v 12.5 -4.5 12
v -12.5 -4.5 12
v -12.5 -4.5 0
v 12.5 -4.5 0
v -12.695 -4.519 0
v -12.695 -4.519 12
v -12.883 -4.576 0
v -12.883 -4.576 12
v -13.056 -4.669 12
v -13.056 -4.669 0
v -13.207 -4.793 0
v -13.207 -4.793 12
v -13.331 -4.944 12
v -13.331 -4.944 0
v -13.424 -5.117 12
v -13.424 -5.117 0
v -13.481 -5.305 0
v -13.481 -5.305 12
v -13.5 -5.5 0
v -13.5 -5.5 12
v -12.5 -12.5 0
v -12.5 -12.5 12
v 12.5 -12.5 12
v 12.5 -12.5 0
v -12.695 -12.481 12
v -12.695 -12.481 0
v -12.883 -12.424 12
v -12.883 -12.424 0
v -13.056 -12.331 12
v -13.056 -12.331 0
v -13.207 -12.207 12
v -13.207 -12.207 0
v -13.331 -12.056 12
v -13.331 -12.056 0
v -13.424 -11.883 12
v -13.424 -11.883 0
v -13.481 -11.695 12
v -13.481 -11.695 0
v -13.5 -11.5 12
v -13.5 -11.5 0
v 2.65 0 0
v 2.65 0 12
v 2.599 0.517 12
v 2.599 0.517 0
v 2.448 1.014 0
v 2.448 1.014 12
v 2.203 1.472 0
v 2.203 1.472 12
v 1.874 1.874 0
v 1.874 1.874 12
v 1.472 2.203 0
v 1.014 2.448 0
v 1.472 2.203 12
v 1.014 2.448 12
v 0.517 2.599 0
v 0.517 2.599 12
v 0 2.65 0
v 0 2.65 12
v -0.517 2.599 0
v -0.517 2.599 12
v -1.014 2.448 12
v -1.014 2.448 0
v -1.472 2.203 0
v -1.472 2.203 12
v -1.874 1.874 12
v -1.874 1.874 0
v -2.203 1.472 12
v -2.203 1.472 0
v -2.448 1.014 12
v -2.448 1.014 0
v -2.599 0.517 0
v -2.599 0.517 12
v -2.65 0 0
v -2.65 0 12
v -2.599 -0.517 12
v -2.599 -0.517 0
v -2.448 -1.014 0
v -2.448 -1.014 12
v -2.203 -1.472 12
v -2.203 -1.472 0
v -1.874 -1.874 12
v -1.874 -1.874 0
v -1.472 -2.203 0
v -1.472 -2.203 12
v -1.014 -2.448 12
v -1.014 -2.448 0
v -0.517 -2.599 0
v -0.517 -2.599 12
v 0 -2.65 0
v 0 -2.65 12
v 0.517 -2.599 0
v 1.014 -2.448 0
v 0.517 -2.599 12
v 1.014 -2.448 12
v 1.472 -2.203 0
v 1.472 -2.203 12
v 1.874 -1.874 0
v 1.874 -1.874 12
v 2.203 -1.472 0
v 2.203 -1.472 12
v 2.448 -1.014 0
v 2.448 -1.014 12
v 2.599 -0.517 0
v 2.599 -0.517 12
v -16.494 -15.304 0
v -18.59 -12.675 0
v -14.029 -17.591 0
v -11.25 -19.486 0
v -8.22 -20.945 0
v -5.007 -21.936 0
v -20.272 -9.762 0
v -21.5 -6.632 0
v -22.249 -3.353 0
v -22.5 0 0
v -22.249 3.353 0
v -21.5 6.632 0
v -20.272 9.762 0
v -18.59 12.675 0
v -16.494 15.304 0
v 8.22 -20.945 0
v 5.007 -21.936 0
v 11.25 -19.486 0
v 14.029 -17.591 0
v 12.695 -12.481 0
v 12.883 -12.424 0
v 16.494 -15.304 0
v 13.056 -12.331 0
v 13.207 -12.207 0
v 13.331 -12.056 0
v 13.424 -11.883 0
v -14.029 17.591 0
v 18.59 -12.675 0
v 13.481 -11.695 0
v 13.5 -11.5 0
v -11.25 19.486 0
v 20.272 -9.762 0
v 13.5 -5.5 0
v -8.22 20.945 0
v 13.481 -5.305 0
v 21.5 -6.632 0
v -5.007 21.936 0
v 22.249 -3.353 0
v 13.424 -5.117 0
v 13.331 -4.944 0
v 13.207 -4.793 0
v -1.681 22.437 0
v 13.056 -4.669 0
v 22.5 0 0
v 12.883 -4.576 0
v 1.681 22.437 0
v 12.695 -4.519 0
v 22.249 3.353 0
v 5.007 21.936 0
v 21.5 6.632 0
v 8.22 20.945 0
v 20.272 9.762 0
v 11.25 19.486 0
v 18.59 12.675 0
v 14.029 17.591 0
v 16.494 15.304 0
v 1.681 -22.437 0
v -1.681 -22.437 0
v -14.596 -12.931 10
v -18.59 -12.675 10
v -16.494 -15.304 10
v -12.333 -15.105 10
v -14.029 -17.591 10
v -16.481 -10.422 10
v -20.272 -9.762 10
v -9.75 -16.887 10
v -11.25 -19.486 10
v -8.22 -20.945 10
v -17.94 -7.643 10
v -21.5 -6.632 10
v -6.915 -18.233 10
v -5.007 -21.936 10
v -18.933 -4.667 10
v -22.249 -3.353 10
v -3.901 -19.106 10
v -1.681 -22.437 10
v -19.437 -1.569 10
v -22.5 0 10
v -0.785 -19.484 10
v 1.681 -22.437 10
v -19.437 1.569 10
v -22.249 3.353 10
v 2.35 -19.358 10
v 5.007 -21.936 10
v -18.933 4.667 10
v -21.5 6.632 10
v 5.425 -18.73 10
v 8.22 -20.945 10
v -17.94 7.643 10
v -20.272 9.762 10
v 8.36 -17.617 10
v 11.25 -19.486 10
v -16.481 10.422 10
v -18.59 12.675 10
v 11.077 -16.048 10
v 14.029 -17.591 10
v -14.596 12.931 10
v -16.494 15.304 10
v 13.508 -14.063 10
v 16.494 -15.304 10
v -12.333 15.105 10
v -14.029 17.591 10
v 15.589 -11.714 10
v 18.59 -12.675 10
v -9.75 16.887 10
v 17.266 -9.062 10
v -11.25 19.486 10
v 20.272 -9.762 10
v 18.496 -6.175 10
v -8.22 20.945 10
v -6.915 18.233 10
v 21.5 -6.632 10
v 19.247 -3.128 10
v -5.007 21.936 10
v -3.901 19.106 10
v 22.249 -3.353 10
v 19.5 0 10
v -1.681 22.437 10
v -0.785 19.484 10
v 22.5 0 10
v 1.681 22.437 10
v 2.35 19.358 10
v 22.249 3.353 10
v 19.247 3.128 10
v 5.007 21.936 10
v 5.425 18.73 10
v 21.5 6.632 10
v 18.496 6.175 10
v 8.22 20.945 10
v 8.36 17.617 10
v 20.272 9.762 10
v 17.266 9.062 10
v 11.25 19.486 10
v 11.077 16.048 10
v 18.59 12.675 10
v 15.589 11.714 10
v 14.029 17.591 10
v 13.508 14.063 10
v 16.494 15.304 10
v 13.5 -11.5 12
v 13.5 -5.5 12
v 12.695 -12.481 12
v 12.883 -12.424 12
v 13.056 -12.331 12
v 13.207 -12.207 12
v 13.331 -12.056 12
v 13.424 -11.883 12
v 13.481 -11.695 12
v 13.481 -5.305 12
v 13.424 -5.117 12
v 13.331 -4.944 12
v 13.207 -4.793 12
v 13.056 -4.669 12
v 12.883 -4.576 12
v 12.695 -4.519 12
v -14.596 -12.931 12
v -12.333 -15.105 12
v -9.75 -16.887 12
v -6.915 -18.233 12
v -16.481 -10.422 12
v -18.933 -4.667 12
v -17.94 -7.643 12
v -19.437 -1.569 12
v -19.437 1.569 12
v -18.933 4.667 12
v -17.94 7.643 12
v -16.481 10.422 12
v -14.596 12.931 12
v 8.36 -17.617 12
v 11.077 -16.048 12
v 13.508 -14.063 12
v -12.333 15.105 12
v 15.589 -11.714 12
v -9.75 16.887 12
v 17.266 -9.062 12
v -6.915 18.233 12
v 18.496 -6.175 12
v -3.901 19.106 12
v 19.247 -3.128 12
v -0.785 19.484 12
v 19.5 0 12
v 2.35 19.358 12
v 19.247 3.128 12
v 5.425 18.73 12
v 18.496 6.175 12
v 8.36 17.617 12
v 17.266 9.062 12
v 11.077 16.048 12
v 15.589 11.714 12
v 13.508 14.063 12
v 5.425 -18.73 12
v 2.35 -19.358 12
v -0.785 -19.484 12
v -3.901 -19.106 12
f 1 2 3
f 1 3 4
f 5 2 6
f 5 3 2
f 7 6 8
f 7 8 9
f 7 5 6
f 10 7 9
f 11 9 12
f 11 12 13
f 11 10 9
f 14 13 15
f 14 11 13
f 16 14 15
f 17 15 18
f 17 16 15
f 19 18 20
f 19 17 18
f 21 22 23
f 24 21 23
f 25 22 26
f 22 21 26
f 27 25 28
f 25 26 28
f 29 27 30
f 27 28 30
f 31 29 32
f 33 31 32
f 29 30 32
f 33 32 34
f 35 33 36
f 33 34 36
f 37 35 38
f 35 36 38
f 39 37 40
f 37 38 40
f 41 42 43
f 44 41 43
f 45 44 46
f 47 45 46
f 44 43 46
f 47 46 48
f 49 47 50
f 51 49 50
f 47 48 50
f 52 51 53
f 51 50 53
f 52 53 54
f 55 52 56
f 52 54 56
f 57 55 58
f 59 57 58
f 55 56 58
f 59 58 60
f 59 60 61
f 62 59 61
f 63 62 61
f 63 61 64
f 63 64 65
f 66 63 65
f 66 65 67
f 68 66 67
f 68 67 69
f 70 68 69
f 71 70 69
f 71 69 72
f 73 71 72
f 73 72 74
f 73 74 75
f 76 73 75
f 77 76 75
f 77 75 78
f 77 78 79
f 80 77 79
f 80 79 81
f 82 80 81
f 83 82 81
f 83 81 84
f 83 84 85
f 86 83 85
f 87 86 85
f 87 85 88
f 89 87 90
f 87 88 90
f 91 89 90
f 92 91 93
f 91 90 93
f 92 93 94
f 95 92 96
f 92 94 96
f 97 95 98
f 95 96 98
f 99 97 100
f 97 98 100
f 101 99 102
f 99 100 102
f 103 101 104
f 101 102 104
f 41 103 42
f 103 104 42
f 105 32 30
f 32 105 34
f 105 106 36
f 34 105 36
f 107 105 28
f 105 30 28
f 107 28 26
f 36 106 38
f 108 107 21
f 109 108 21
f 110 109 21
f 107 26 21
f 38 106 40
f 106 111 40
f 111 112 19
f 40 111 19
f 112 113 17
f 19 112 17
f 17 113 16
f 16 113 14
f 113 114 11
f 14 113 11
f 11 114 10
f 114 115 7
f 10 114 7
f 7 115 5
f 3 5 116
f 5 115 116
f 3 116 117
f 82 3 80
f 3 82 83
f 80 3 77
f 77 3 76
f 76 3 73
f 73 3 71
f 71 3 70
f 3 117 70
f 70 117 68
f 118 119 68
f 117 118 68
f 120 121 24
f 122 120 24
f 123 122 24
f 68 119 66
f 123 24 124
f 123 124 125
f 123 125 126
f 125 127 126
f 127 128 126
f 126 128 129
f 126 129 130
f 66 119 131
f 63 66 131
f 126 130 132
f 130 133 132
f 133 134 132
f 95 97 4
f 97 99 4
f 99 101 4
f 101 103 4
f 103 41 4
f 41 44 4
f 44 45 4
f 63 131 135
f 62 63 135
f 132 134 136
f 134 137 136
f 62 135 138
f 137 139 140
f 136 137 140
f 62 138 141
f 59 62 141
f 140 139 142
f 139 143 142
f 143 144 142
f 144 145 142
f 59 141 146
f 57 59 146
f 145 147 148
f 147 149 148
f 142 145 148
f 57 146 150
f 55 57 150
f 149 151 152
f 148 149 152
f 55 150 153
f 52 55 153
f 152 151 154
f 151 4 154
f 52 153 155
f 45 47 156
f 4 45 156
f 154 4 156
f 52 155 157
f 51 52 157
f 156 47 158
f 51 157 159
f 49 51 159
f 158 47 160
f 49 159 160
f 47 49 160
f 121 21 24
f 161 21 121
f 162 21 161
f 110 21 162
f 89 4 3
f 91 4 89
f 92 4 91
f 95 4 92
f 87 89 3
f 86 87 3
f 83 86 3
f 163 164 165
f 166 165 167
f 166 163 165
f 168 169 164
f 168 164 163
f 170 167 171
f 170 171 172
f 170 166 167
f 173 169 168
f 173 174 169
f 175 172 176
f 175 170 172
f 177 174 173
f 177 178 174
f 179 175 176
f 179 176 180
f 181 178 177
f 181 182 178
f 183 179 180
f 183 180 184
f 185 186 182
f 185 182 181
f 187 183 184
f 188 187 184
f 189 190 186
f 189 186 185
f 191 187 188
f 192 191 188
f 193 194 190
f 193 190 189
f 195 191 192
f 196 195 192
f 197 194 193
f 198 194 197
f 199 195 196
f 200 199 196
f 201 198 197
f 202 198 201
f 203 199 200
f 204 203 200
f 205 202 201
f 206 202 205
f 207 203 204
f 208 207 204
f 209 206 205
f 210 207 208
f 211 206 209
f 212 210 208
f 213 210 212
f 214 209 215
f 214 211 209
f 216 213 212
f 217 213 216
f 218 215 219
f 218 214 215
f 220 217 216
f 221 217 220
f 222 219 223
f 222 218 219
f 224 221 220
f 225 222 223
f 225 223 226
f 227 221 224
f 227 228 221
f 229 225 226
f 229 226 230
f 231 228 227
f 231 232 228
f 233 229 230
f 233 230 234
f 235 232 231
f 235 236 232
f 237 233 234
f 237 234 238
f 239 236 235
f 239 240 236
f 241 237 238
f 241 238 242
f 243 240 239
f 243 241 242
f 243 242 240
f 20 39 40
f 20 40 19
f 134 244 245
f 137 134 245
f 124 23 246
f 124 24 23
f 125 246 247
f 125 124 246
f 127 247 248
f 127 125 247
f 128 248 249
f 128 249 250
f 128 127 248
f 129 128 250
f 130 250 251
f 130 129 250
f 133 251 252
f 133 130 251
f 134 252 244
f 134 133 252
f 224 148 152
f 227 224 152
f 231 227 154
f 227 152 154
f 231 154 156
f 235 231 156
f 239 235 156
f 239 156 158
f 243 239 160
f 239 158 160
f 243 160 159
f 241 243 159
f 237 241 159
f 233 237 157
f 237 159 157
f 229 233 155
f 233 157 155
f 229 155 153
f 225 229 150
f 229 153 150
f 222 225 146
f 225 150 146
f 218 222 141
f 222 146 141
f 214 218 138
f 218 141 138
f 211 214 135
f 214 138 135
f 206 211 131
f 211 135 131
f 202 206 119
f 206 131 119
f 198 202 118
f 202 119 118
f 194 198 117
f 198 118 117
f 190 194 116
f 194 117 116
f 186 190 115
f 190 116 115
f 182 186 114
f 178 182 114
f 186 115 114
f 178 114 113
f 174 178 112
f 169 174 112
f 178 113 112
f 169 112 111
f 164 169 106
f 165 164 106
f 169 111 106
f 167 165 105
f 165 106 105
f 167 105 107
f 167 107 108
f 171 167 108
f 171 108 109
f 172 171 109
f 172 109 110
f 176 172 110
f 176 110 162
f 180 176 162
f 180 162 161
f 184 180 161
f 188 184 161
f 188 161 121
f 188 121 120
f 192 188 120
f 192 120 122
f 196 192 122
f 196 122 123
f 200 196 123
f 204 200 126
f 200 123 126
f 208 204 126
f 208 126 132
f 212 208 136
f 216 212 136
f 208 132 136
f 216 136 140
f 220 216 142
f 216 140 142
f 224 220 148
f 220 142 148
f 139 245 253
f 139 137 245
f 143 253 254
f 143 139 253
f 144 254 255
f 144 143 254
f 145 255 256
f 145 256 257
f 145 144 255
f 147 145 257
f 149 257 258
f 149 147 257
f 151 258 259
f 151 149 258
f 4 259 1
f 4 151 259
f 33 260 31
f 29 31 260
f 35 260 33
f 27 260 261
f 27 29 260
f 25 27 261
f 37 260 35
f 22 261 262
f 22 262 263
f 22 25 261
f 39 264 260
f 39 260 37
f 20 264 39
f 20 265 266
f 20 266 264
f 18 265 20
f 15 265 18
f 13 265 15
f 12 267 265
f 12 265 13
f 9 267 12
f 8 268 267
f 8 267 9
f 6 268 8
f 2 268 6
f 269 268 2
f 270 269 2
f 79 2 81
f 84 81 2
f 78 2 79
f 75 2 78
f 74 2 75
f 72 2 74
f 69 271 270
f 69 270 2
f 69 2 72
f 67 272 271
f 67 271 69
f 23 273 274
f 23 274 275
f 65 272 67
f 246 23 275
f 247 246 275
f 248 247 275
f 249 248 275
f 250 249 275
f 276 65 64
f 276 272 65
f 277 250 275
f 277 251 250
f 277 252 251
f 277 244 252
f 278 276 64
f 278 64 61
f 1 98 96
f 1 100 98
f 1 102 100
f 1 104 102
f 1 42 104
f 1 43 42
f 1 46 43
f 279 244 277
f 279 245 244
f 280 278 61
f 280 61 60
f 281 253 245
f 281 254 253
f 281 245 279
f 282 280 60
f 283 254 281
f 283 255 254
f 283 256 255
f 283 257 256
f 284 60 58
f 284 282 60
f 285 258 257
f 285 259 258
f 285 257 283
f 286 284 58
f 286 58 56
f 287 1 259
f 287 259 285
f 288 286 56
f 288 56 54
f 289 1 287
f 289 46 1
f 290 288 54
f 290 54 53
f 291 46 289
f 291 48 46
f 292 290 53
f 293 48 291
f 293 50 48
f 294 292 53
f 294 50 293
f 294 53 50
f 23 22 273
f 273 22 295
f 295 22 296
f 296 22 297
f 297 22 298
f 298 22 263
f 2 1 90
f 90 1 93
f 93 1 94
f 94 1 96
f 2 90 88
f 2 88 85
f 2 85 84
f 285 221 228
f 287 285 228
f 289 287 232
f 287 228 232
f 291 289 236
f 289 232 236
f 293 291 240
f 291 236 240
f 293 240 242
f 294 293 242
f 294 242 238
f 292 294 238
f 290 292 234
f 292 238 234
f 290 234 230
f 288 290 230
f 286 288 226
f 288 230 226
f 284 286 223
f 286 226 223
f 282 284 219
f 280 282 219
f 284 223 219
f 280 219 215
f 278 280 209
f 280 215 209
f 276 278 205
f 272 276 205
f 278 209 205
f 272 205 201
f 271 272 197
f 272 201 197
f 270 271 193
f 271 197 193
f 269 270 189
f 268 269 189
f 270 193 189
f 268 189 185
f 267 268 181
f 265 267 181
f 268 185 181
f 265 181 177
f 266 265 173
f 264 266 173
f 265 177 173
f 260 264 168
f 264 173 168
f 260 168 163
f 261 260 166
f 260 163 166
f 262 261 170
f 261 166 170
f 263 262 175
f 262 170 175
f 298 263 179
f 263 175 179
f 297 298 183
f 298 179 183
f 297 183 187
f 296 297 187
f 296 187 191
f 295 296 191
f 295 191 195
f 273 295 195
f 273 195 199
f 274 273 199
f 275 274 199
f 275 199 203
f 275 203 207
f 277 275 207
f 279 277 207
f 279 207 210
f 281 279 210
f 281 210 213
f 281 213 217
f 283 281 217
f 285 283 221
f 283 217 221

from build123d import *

# Parameters (mm, degrees)
F0_R     = 22.5
F1_DEPTH = 10
F3_R     = 19.5
F4_DEPTH = 2
F5_R     = 2.65
F5_W     = 27
F5_H     = 8
F6_DEPTH = 12.001
F8_R     = 1


with BuildPart() as f1:
    # F0 (on Top) → F1 (new body)
    with BuildSketch(Plane.XY):
        Circle(F0_R)
    extrude(amount=F1_DEPTH)

    # F3 (on face) → F4 (join)
    with BuildSketch(Plane.XY.offset(10)):
        Circle(F3_R)
    extrude(amount=F4_DEPTH)

    # F5 (on face) → F6 (cut, through all)
    with BuildSketch(Plane.XY.offset(12)):
        Circle(F5_R)
        with Locations((0, -8.5)):
            Rectangle(F5_W, F5_H)
    extrude(amount=-F6_DEPTH, mode=Mode.SUBTRACT)

    # F8
    f8_edges = [f1.edges().sort_by_distance(p)[0] for p in [
        (-13.5, -12.5, 6),
        (-13.5, -4.5, 6),
        (13.5, -4.5, 6),
        (13.5, -12.5, 6),
    ]]
    fillet(f8_edges, radius=F8_R)


solid = f1.part
